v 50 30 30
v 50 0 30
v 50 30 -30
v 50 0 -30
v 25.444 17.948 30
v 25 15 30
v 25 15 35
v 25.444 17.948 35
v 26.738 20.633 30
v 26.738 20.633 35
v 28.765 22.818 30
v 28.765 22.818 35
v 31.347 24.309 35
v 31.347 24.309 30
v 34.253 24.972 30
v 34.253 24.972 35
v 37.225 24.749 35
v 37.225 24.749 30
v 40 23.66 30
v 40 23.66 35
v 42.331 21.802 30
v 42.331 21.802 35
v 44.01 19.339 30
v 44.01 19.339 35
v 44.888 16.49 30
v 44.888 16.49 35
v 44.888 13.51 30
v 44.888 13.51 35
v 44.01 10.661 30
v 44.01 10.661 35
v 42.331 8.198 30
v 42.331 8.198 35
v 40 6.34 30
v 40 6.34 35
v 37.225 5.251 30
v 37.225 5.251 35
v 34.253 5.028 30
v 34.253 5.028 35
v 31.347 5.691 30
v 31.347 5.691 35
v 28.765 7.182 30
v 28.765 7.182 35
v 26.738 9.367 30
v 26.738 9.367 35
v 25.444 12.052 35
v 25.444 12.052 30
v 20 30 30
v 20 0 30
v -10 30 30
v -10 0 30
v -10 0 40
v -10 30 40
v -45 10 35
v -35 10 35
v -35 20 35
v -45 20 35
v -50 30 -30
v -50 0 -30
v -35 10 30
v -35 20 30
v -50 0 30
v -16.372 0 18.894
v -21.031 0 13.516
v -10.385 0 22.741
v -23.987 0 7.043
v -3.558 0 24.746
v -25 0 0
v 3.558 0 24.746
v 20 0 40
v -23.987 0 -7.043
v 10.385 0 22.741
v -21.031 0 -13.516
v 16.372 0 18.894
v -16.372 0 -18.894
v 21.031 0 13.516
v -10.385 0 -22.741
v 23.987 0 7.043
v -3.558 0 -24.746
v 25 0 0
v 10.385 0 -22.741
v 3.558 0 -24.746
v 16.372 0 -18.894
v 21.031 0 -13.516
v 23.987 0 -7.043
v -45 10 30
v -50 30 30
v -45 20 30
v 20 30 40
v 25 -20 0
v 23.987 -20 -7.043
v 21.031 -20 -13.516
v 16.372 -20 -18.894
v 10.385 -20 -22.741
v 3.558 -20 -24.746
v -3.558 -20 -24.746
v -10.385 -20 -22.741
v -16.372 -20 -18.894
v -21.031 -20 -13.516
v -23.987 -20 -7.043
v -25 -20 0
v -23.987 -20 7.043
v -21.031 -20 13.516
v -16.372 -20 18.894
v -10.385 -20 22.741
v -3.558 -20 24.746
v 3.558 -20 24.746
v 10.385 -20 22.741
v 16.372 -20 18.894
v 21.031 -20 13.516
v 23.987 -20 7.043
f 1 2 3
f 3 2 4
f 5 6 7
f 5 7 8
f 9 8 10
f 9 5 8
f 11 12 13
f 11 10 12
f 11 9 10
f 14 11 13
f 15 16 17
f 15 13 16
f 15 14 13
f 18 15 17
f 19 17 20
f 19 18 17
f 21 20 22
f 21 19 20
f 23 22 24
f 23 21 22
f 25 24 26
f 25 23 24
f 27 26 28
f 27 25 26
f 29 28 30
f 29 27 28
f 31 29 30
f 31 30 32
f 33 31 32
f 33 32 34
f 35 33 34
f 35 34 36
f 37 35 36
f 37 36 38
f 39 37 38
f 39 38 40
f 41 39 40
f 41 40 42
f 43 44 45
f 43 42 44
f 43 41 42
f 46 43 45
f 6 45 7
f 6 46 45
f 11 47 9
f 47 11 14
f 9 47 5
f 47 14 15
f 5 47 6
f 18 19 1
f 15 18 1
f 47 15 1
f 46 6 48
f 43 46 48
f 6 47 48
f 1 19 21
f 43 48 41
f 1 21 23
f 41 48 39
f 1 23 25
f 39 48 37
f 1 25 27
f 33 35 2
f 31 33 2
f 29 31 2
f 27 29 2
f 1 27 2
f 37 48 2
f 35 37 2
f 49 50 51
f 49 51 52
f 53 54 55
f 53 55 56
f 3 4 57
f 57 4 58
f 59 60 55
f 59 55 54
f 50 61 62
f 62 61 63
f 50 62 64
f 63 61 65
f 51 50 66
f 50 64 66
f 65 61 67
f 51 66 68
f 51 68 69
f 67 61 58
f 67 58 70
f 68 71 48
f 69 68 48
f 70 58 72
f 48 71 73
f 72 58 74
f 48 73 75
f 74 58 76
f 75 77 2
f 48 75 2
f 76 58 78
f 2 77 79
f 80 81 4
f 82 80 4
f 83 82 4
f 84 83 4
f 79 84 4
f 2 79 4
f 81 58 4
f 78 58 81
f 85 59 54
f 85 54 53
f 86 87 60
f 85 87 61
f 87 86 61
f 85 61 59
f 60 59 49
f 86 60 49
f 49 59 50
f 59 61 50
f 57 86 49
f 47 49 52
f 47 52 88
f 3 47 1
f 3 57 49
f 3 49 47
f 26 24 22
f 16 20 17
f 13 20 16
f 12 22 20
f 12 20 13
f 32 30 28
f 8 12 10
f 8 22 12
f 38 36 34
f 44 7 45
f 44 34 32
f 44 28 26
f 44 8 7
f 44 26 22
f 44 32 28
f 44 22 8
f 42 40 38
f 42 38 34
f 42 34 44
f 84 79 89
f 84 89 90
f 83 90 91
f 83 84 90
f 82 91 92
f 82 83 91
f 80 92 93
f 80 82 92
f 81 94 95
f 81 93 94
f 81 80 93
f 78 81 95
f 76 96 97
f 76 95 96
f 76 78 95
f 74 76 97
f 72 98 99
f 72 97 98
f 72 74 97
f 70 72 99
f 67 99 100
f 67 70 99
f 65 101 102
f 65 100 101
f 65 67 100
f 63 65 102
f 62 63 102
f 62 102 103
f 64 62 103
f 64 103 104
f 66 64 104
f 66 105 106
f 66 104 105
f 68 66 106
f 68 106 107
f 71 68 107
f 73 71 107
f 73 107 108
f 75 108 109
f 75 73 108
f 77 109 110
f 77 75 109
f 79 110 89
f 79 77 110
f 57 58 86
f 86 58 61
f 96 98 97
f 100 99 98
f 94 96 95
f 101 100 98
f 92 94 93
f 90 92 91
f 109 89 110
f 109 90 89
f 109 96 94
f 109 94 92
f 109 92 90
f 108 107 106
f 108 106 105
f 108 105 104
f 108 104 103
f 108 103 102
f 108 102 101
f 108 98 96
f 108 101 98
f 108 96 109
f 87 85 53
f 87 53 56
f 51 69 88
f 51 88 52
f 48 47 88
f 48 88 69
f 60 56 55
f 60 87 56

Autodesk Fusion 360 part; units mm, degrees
sketch "Sketch1" plane through (0, 0, 0) normal (0, 1, 0) x (1, 0, 0)
  line L0 (-50, -30) -> (50, -30)
  line L1 (50, -30) -> (50, 30)
  line L2 (50, 30) -> (-50, 30)
  line L3 (-50, 30) -> (-50, -30)
  dimension "d1" = 100
  dimension "d2" = 60
extrude "Extrude1" add sketch "Sketch1" along normal blind 30
sketch "Sketch2" plane through (0, 0, 0) normal (0, -1, 0) x (1, 0, 0)
  line L0 (-50, 30) -> (-50, -30)
  line L1 (-50, -30) -> (50, -30)
  line L2 (50, -30) -> (50, 30)
  line L3 (50, 30) -> (-50, 30)
  circle A0 centre (0, 0) radius 25
  dimension "d5" = 50
extrude "Extrude2" add sketch "Sketch2" along normal blind 20 contours A0
sketch "Sketch3" plane through (0, 0, 30) normal (0, 0, 1) x (-1, 0, 0)
  line L0 (50, 0) -> (-50, 0)
  line L1 (-50, 0) -> (-50, -30)
  line L2 (-50, -30) -> (50, -30)
  line L3 (50, -30) -> (50, 0)
  circle A0 centre (-35, -15) radius 10
  dimension "d8" = 20
  dimension "d9" = 15
extrude "Extrude3" add sketch "Sketch3" along normal blind 5 contours A0
sketch "Sketch4" plane through (0, 0, 30) normal (0, 0, 1) x (-1, 0, 0)
  circle A0 centre (-35, -15) radius 10
  line L0 (50, 0) -> (-50, 0)
  line L1 (-50, 0) -> (-50, -30)
  line L2 (-50, -30) -> (50, -30)
  line L3 (50, -30) -> (50, 0)
sketch "Sketch5" plane through (0, 0, 30) normal (0, 0, 1) x (-1, 0, 0)
  line L0 (-20, 0) -> (10, 0)
  line L1 (10, 0) -> (10, -30)
  line L2 (10, -30) -> (-20, -30)
  line L3 (-20, -30) -> (-20, 0)
  line L4 (-20, 0) -> (-10, -10)
  line L5 (10, 0) -> (25, 0)
  dimension "d12" = 30
extrude "Extrude4" add sketch "Sketch5" along normal blind 10
sketch "Sketch6" plane through (0, 0, 30) normal (0, 0, 1) x (-1, 0, 0)
  line L0 (-20, 0) -> (-10, -10)
  line L1 (35, -10) -> (45, -10)
  line L2 (45, -10) -> (45, -20)
  line L3 (45, -20) -> (35, -20)
  line L4 (35, -20) -> (35, -10)
  line L5 (35, -10) -> (45, -20) construction
  line L6 (45, -10) -> (35, -20) construction
  line L7 (50, -30) -> (50, 0)
  point P0 (40, -15)
  dimension "d15" = 15
extrude "Extrude5" add sketch "Sketch6" along normal blind 5
sketch "Sketch7" plane through (0, 0, 30) normal (0, 0, 1) x (-1, 0, 0)
